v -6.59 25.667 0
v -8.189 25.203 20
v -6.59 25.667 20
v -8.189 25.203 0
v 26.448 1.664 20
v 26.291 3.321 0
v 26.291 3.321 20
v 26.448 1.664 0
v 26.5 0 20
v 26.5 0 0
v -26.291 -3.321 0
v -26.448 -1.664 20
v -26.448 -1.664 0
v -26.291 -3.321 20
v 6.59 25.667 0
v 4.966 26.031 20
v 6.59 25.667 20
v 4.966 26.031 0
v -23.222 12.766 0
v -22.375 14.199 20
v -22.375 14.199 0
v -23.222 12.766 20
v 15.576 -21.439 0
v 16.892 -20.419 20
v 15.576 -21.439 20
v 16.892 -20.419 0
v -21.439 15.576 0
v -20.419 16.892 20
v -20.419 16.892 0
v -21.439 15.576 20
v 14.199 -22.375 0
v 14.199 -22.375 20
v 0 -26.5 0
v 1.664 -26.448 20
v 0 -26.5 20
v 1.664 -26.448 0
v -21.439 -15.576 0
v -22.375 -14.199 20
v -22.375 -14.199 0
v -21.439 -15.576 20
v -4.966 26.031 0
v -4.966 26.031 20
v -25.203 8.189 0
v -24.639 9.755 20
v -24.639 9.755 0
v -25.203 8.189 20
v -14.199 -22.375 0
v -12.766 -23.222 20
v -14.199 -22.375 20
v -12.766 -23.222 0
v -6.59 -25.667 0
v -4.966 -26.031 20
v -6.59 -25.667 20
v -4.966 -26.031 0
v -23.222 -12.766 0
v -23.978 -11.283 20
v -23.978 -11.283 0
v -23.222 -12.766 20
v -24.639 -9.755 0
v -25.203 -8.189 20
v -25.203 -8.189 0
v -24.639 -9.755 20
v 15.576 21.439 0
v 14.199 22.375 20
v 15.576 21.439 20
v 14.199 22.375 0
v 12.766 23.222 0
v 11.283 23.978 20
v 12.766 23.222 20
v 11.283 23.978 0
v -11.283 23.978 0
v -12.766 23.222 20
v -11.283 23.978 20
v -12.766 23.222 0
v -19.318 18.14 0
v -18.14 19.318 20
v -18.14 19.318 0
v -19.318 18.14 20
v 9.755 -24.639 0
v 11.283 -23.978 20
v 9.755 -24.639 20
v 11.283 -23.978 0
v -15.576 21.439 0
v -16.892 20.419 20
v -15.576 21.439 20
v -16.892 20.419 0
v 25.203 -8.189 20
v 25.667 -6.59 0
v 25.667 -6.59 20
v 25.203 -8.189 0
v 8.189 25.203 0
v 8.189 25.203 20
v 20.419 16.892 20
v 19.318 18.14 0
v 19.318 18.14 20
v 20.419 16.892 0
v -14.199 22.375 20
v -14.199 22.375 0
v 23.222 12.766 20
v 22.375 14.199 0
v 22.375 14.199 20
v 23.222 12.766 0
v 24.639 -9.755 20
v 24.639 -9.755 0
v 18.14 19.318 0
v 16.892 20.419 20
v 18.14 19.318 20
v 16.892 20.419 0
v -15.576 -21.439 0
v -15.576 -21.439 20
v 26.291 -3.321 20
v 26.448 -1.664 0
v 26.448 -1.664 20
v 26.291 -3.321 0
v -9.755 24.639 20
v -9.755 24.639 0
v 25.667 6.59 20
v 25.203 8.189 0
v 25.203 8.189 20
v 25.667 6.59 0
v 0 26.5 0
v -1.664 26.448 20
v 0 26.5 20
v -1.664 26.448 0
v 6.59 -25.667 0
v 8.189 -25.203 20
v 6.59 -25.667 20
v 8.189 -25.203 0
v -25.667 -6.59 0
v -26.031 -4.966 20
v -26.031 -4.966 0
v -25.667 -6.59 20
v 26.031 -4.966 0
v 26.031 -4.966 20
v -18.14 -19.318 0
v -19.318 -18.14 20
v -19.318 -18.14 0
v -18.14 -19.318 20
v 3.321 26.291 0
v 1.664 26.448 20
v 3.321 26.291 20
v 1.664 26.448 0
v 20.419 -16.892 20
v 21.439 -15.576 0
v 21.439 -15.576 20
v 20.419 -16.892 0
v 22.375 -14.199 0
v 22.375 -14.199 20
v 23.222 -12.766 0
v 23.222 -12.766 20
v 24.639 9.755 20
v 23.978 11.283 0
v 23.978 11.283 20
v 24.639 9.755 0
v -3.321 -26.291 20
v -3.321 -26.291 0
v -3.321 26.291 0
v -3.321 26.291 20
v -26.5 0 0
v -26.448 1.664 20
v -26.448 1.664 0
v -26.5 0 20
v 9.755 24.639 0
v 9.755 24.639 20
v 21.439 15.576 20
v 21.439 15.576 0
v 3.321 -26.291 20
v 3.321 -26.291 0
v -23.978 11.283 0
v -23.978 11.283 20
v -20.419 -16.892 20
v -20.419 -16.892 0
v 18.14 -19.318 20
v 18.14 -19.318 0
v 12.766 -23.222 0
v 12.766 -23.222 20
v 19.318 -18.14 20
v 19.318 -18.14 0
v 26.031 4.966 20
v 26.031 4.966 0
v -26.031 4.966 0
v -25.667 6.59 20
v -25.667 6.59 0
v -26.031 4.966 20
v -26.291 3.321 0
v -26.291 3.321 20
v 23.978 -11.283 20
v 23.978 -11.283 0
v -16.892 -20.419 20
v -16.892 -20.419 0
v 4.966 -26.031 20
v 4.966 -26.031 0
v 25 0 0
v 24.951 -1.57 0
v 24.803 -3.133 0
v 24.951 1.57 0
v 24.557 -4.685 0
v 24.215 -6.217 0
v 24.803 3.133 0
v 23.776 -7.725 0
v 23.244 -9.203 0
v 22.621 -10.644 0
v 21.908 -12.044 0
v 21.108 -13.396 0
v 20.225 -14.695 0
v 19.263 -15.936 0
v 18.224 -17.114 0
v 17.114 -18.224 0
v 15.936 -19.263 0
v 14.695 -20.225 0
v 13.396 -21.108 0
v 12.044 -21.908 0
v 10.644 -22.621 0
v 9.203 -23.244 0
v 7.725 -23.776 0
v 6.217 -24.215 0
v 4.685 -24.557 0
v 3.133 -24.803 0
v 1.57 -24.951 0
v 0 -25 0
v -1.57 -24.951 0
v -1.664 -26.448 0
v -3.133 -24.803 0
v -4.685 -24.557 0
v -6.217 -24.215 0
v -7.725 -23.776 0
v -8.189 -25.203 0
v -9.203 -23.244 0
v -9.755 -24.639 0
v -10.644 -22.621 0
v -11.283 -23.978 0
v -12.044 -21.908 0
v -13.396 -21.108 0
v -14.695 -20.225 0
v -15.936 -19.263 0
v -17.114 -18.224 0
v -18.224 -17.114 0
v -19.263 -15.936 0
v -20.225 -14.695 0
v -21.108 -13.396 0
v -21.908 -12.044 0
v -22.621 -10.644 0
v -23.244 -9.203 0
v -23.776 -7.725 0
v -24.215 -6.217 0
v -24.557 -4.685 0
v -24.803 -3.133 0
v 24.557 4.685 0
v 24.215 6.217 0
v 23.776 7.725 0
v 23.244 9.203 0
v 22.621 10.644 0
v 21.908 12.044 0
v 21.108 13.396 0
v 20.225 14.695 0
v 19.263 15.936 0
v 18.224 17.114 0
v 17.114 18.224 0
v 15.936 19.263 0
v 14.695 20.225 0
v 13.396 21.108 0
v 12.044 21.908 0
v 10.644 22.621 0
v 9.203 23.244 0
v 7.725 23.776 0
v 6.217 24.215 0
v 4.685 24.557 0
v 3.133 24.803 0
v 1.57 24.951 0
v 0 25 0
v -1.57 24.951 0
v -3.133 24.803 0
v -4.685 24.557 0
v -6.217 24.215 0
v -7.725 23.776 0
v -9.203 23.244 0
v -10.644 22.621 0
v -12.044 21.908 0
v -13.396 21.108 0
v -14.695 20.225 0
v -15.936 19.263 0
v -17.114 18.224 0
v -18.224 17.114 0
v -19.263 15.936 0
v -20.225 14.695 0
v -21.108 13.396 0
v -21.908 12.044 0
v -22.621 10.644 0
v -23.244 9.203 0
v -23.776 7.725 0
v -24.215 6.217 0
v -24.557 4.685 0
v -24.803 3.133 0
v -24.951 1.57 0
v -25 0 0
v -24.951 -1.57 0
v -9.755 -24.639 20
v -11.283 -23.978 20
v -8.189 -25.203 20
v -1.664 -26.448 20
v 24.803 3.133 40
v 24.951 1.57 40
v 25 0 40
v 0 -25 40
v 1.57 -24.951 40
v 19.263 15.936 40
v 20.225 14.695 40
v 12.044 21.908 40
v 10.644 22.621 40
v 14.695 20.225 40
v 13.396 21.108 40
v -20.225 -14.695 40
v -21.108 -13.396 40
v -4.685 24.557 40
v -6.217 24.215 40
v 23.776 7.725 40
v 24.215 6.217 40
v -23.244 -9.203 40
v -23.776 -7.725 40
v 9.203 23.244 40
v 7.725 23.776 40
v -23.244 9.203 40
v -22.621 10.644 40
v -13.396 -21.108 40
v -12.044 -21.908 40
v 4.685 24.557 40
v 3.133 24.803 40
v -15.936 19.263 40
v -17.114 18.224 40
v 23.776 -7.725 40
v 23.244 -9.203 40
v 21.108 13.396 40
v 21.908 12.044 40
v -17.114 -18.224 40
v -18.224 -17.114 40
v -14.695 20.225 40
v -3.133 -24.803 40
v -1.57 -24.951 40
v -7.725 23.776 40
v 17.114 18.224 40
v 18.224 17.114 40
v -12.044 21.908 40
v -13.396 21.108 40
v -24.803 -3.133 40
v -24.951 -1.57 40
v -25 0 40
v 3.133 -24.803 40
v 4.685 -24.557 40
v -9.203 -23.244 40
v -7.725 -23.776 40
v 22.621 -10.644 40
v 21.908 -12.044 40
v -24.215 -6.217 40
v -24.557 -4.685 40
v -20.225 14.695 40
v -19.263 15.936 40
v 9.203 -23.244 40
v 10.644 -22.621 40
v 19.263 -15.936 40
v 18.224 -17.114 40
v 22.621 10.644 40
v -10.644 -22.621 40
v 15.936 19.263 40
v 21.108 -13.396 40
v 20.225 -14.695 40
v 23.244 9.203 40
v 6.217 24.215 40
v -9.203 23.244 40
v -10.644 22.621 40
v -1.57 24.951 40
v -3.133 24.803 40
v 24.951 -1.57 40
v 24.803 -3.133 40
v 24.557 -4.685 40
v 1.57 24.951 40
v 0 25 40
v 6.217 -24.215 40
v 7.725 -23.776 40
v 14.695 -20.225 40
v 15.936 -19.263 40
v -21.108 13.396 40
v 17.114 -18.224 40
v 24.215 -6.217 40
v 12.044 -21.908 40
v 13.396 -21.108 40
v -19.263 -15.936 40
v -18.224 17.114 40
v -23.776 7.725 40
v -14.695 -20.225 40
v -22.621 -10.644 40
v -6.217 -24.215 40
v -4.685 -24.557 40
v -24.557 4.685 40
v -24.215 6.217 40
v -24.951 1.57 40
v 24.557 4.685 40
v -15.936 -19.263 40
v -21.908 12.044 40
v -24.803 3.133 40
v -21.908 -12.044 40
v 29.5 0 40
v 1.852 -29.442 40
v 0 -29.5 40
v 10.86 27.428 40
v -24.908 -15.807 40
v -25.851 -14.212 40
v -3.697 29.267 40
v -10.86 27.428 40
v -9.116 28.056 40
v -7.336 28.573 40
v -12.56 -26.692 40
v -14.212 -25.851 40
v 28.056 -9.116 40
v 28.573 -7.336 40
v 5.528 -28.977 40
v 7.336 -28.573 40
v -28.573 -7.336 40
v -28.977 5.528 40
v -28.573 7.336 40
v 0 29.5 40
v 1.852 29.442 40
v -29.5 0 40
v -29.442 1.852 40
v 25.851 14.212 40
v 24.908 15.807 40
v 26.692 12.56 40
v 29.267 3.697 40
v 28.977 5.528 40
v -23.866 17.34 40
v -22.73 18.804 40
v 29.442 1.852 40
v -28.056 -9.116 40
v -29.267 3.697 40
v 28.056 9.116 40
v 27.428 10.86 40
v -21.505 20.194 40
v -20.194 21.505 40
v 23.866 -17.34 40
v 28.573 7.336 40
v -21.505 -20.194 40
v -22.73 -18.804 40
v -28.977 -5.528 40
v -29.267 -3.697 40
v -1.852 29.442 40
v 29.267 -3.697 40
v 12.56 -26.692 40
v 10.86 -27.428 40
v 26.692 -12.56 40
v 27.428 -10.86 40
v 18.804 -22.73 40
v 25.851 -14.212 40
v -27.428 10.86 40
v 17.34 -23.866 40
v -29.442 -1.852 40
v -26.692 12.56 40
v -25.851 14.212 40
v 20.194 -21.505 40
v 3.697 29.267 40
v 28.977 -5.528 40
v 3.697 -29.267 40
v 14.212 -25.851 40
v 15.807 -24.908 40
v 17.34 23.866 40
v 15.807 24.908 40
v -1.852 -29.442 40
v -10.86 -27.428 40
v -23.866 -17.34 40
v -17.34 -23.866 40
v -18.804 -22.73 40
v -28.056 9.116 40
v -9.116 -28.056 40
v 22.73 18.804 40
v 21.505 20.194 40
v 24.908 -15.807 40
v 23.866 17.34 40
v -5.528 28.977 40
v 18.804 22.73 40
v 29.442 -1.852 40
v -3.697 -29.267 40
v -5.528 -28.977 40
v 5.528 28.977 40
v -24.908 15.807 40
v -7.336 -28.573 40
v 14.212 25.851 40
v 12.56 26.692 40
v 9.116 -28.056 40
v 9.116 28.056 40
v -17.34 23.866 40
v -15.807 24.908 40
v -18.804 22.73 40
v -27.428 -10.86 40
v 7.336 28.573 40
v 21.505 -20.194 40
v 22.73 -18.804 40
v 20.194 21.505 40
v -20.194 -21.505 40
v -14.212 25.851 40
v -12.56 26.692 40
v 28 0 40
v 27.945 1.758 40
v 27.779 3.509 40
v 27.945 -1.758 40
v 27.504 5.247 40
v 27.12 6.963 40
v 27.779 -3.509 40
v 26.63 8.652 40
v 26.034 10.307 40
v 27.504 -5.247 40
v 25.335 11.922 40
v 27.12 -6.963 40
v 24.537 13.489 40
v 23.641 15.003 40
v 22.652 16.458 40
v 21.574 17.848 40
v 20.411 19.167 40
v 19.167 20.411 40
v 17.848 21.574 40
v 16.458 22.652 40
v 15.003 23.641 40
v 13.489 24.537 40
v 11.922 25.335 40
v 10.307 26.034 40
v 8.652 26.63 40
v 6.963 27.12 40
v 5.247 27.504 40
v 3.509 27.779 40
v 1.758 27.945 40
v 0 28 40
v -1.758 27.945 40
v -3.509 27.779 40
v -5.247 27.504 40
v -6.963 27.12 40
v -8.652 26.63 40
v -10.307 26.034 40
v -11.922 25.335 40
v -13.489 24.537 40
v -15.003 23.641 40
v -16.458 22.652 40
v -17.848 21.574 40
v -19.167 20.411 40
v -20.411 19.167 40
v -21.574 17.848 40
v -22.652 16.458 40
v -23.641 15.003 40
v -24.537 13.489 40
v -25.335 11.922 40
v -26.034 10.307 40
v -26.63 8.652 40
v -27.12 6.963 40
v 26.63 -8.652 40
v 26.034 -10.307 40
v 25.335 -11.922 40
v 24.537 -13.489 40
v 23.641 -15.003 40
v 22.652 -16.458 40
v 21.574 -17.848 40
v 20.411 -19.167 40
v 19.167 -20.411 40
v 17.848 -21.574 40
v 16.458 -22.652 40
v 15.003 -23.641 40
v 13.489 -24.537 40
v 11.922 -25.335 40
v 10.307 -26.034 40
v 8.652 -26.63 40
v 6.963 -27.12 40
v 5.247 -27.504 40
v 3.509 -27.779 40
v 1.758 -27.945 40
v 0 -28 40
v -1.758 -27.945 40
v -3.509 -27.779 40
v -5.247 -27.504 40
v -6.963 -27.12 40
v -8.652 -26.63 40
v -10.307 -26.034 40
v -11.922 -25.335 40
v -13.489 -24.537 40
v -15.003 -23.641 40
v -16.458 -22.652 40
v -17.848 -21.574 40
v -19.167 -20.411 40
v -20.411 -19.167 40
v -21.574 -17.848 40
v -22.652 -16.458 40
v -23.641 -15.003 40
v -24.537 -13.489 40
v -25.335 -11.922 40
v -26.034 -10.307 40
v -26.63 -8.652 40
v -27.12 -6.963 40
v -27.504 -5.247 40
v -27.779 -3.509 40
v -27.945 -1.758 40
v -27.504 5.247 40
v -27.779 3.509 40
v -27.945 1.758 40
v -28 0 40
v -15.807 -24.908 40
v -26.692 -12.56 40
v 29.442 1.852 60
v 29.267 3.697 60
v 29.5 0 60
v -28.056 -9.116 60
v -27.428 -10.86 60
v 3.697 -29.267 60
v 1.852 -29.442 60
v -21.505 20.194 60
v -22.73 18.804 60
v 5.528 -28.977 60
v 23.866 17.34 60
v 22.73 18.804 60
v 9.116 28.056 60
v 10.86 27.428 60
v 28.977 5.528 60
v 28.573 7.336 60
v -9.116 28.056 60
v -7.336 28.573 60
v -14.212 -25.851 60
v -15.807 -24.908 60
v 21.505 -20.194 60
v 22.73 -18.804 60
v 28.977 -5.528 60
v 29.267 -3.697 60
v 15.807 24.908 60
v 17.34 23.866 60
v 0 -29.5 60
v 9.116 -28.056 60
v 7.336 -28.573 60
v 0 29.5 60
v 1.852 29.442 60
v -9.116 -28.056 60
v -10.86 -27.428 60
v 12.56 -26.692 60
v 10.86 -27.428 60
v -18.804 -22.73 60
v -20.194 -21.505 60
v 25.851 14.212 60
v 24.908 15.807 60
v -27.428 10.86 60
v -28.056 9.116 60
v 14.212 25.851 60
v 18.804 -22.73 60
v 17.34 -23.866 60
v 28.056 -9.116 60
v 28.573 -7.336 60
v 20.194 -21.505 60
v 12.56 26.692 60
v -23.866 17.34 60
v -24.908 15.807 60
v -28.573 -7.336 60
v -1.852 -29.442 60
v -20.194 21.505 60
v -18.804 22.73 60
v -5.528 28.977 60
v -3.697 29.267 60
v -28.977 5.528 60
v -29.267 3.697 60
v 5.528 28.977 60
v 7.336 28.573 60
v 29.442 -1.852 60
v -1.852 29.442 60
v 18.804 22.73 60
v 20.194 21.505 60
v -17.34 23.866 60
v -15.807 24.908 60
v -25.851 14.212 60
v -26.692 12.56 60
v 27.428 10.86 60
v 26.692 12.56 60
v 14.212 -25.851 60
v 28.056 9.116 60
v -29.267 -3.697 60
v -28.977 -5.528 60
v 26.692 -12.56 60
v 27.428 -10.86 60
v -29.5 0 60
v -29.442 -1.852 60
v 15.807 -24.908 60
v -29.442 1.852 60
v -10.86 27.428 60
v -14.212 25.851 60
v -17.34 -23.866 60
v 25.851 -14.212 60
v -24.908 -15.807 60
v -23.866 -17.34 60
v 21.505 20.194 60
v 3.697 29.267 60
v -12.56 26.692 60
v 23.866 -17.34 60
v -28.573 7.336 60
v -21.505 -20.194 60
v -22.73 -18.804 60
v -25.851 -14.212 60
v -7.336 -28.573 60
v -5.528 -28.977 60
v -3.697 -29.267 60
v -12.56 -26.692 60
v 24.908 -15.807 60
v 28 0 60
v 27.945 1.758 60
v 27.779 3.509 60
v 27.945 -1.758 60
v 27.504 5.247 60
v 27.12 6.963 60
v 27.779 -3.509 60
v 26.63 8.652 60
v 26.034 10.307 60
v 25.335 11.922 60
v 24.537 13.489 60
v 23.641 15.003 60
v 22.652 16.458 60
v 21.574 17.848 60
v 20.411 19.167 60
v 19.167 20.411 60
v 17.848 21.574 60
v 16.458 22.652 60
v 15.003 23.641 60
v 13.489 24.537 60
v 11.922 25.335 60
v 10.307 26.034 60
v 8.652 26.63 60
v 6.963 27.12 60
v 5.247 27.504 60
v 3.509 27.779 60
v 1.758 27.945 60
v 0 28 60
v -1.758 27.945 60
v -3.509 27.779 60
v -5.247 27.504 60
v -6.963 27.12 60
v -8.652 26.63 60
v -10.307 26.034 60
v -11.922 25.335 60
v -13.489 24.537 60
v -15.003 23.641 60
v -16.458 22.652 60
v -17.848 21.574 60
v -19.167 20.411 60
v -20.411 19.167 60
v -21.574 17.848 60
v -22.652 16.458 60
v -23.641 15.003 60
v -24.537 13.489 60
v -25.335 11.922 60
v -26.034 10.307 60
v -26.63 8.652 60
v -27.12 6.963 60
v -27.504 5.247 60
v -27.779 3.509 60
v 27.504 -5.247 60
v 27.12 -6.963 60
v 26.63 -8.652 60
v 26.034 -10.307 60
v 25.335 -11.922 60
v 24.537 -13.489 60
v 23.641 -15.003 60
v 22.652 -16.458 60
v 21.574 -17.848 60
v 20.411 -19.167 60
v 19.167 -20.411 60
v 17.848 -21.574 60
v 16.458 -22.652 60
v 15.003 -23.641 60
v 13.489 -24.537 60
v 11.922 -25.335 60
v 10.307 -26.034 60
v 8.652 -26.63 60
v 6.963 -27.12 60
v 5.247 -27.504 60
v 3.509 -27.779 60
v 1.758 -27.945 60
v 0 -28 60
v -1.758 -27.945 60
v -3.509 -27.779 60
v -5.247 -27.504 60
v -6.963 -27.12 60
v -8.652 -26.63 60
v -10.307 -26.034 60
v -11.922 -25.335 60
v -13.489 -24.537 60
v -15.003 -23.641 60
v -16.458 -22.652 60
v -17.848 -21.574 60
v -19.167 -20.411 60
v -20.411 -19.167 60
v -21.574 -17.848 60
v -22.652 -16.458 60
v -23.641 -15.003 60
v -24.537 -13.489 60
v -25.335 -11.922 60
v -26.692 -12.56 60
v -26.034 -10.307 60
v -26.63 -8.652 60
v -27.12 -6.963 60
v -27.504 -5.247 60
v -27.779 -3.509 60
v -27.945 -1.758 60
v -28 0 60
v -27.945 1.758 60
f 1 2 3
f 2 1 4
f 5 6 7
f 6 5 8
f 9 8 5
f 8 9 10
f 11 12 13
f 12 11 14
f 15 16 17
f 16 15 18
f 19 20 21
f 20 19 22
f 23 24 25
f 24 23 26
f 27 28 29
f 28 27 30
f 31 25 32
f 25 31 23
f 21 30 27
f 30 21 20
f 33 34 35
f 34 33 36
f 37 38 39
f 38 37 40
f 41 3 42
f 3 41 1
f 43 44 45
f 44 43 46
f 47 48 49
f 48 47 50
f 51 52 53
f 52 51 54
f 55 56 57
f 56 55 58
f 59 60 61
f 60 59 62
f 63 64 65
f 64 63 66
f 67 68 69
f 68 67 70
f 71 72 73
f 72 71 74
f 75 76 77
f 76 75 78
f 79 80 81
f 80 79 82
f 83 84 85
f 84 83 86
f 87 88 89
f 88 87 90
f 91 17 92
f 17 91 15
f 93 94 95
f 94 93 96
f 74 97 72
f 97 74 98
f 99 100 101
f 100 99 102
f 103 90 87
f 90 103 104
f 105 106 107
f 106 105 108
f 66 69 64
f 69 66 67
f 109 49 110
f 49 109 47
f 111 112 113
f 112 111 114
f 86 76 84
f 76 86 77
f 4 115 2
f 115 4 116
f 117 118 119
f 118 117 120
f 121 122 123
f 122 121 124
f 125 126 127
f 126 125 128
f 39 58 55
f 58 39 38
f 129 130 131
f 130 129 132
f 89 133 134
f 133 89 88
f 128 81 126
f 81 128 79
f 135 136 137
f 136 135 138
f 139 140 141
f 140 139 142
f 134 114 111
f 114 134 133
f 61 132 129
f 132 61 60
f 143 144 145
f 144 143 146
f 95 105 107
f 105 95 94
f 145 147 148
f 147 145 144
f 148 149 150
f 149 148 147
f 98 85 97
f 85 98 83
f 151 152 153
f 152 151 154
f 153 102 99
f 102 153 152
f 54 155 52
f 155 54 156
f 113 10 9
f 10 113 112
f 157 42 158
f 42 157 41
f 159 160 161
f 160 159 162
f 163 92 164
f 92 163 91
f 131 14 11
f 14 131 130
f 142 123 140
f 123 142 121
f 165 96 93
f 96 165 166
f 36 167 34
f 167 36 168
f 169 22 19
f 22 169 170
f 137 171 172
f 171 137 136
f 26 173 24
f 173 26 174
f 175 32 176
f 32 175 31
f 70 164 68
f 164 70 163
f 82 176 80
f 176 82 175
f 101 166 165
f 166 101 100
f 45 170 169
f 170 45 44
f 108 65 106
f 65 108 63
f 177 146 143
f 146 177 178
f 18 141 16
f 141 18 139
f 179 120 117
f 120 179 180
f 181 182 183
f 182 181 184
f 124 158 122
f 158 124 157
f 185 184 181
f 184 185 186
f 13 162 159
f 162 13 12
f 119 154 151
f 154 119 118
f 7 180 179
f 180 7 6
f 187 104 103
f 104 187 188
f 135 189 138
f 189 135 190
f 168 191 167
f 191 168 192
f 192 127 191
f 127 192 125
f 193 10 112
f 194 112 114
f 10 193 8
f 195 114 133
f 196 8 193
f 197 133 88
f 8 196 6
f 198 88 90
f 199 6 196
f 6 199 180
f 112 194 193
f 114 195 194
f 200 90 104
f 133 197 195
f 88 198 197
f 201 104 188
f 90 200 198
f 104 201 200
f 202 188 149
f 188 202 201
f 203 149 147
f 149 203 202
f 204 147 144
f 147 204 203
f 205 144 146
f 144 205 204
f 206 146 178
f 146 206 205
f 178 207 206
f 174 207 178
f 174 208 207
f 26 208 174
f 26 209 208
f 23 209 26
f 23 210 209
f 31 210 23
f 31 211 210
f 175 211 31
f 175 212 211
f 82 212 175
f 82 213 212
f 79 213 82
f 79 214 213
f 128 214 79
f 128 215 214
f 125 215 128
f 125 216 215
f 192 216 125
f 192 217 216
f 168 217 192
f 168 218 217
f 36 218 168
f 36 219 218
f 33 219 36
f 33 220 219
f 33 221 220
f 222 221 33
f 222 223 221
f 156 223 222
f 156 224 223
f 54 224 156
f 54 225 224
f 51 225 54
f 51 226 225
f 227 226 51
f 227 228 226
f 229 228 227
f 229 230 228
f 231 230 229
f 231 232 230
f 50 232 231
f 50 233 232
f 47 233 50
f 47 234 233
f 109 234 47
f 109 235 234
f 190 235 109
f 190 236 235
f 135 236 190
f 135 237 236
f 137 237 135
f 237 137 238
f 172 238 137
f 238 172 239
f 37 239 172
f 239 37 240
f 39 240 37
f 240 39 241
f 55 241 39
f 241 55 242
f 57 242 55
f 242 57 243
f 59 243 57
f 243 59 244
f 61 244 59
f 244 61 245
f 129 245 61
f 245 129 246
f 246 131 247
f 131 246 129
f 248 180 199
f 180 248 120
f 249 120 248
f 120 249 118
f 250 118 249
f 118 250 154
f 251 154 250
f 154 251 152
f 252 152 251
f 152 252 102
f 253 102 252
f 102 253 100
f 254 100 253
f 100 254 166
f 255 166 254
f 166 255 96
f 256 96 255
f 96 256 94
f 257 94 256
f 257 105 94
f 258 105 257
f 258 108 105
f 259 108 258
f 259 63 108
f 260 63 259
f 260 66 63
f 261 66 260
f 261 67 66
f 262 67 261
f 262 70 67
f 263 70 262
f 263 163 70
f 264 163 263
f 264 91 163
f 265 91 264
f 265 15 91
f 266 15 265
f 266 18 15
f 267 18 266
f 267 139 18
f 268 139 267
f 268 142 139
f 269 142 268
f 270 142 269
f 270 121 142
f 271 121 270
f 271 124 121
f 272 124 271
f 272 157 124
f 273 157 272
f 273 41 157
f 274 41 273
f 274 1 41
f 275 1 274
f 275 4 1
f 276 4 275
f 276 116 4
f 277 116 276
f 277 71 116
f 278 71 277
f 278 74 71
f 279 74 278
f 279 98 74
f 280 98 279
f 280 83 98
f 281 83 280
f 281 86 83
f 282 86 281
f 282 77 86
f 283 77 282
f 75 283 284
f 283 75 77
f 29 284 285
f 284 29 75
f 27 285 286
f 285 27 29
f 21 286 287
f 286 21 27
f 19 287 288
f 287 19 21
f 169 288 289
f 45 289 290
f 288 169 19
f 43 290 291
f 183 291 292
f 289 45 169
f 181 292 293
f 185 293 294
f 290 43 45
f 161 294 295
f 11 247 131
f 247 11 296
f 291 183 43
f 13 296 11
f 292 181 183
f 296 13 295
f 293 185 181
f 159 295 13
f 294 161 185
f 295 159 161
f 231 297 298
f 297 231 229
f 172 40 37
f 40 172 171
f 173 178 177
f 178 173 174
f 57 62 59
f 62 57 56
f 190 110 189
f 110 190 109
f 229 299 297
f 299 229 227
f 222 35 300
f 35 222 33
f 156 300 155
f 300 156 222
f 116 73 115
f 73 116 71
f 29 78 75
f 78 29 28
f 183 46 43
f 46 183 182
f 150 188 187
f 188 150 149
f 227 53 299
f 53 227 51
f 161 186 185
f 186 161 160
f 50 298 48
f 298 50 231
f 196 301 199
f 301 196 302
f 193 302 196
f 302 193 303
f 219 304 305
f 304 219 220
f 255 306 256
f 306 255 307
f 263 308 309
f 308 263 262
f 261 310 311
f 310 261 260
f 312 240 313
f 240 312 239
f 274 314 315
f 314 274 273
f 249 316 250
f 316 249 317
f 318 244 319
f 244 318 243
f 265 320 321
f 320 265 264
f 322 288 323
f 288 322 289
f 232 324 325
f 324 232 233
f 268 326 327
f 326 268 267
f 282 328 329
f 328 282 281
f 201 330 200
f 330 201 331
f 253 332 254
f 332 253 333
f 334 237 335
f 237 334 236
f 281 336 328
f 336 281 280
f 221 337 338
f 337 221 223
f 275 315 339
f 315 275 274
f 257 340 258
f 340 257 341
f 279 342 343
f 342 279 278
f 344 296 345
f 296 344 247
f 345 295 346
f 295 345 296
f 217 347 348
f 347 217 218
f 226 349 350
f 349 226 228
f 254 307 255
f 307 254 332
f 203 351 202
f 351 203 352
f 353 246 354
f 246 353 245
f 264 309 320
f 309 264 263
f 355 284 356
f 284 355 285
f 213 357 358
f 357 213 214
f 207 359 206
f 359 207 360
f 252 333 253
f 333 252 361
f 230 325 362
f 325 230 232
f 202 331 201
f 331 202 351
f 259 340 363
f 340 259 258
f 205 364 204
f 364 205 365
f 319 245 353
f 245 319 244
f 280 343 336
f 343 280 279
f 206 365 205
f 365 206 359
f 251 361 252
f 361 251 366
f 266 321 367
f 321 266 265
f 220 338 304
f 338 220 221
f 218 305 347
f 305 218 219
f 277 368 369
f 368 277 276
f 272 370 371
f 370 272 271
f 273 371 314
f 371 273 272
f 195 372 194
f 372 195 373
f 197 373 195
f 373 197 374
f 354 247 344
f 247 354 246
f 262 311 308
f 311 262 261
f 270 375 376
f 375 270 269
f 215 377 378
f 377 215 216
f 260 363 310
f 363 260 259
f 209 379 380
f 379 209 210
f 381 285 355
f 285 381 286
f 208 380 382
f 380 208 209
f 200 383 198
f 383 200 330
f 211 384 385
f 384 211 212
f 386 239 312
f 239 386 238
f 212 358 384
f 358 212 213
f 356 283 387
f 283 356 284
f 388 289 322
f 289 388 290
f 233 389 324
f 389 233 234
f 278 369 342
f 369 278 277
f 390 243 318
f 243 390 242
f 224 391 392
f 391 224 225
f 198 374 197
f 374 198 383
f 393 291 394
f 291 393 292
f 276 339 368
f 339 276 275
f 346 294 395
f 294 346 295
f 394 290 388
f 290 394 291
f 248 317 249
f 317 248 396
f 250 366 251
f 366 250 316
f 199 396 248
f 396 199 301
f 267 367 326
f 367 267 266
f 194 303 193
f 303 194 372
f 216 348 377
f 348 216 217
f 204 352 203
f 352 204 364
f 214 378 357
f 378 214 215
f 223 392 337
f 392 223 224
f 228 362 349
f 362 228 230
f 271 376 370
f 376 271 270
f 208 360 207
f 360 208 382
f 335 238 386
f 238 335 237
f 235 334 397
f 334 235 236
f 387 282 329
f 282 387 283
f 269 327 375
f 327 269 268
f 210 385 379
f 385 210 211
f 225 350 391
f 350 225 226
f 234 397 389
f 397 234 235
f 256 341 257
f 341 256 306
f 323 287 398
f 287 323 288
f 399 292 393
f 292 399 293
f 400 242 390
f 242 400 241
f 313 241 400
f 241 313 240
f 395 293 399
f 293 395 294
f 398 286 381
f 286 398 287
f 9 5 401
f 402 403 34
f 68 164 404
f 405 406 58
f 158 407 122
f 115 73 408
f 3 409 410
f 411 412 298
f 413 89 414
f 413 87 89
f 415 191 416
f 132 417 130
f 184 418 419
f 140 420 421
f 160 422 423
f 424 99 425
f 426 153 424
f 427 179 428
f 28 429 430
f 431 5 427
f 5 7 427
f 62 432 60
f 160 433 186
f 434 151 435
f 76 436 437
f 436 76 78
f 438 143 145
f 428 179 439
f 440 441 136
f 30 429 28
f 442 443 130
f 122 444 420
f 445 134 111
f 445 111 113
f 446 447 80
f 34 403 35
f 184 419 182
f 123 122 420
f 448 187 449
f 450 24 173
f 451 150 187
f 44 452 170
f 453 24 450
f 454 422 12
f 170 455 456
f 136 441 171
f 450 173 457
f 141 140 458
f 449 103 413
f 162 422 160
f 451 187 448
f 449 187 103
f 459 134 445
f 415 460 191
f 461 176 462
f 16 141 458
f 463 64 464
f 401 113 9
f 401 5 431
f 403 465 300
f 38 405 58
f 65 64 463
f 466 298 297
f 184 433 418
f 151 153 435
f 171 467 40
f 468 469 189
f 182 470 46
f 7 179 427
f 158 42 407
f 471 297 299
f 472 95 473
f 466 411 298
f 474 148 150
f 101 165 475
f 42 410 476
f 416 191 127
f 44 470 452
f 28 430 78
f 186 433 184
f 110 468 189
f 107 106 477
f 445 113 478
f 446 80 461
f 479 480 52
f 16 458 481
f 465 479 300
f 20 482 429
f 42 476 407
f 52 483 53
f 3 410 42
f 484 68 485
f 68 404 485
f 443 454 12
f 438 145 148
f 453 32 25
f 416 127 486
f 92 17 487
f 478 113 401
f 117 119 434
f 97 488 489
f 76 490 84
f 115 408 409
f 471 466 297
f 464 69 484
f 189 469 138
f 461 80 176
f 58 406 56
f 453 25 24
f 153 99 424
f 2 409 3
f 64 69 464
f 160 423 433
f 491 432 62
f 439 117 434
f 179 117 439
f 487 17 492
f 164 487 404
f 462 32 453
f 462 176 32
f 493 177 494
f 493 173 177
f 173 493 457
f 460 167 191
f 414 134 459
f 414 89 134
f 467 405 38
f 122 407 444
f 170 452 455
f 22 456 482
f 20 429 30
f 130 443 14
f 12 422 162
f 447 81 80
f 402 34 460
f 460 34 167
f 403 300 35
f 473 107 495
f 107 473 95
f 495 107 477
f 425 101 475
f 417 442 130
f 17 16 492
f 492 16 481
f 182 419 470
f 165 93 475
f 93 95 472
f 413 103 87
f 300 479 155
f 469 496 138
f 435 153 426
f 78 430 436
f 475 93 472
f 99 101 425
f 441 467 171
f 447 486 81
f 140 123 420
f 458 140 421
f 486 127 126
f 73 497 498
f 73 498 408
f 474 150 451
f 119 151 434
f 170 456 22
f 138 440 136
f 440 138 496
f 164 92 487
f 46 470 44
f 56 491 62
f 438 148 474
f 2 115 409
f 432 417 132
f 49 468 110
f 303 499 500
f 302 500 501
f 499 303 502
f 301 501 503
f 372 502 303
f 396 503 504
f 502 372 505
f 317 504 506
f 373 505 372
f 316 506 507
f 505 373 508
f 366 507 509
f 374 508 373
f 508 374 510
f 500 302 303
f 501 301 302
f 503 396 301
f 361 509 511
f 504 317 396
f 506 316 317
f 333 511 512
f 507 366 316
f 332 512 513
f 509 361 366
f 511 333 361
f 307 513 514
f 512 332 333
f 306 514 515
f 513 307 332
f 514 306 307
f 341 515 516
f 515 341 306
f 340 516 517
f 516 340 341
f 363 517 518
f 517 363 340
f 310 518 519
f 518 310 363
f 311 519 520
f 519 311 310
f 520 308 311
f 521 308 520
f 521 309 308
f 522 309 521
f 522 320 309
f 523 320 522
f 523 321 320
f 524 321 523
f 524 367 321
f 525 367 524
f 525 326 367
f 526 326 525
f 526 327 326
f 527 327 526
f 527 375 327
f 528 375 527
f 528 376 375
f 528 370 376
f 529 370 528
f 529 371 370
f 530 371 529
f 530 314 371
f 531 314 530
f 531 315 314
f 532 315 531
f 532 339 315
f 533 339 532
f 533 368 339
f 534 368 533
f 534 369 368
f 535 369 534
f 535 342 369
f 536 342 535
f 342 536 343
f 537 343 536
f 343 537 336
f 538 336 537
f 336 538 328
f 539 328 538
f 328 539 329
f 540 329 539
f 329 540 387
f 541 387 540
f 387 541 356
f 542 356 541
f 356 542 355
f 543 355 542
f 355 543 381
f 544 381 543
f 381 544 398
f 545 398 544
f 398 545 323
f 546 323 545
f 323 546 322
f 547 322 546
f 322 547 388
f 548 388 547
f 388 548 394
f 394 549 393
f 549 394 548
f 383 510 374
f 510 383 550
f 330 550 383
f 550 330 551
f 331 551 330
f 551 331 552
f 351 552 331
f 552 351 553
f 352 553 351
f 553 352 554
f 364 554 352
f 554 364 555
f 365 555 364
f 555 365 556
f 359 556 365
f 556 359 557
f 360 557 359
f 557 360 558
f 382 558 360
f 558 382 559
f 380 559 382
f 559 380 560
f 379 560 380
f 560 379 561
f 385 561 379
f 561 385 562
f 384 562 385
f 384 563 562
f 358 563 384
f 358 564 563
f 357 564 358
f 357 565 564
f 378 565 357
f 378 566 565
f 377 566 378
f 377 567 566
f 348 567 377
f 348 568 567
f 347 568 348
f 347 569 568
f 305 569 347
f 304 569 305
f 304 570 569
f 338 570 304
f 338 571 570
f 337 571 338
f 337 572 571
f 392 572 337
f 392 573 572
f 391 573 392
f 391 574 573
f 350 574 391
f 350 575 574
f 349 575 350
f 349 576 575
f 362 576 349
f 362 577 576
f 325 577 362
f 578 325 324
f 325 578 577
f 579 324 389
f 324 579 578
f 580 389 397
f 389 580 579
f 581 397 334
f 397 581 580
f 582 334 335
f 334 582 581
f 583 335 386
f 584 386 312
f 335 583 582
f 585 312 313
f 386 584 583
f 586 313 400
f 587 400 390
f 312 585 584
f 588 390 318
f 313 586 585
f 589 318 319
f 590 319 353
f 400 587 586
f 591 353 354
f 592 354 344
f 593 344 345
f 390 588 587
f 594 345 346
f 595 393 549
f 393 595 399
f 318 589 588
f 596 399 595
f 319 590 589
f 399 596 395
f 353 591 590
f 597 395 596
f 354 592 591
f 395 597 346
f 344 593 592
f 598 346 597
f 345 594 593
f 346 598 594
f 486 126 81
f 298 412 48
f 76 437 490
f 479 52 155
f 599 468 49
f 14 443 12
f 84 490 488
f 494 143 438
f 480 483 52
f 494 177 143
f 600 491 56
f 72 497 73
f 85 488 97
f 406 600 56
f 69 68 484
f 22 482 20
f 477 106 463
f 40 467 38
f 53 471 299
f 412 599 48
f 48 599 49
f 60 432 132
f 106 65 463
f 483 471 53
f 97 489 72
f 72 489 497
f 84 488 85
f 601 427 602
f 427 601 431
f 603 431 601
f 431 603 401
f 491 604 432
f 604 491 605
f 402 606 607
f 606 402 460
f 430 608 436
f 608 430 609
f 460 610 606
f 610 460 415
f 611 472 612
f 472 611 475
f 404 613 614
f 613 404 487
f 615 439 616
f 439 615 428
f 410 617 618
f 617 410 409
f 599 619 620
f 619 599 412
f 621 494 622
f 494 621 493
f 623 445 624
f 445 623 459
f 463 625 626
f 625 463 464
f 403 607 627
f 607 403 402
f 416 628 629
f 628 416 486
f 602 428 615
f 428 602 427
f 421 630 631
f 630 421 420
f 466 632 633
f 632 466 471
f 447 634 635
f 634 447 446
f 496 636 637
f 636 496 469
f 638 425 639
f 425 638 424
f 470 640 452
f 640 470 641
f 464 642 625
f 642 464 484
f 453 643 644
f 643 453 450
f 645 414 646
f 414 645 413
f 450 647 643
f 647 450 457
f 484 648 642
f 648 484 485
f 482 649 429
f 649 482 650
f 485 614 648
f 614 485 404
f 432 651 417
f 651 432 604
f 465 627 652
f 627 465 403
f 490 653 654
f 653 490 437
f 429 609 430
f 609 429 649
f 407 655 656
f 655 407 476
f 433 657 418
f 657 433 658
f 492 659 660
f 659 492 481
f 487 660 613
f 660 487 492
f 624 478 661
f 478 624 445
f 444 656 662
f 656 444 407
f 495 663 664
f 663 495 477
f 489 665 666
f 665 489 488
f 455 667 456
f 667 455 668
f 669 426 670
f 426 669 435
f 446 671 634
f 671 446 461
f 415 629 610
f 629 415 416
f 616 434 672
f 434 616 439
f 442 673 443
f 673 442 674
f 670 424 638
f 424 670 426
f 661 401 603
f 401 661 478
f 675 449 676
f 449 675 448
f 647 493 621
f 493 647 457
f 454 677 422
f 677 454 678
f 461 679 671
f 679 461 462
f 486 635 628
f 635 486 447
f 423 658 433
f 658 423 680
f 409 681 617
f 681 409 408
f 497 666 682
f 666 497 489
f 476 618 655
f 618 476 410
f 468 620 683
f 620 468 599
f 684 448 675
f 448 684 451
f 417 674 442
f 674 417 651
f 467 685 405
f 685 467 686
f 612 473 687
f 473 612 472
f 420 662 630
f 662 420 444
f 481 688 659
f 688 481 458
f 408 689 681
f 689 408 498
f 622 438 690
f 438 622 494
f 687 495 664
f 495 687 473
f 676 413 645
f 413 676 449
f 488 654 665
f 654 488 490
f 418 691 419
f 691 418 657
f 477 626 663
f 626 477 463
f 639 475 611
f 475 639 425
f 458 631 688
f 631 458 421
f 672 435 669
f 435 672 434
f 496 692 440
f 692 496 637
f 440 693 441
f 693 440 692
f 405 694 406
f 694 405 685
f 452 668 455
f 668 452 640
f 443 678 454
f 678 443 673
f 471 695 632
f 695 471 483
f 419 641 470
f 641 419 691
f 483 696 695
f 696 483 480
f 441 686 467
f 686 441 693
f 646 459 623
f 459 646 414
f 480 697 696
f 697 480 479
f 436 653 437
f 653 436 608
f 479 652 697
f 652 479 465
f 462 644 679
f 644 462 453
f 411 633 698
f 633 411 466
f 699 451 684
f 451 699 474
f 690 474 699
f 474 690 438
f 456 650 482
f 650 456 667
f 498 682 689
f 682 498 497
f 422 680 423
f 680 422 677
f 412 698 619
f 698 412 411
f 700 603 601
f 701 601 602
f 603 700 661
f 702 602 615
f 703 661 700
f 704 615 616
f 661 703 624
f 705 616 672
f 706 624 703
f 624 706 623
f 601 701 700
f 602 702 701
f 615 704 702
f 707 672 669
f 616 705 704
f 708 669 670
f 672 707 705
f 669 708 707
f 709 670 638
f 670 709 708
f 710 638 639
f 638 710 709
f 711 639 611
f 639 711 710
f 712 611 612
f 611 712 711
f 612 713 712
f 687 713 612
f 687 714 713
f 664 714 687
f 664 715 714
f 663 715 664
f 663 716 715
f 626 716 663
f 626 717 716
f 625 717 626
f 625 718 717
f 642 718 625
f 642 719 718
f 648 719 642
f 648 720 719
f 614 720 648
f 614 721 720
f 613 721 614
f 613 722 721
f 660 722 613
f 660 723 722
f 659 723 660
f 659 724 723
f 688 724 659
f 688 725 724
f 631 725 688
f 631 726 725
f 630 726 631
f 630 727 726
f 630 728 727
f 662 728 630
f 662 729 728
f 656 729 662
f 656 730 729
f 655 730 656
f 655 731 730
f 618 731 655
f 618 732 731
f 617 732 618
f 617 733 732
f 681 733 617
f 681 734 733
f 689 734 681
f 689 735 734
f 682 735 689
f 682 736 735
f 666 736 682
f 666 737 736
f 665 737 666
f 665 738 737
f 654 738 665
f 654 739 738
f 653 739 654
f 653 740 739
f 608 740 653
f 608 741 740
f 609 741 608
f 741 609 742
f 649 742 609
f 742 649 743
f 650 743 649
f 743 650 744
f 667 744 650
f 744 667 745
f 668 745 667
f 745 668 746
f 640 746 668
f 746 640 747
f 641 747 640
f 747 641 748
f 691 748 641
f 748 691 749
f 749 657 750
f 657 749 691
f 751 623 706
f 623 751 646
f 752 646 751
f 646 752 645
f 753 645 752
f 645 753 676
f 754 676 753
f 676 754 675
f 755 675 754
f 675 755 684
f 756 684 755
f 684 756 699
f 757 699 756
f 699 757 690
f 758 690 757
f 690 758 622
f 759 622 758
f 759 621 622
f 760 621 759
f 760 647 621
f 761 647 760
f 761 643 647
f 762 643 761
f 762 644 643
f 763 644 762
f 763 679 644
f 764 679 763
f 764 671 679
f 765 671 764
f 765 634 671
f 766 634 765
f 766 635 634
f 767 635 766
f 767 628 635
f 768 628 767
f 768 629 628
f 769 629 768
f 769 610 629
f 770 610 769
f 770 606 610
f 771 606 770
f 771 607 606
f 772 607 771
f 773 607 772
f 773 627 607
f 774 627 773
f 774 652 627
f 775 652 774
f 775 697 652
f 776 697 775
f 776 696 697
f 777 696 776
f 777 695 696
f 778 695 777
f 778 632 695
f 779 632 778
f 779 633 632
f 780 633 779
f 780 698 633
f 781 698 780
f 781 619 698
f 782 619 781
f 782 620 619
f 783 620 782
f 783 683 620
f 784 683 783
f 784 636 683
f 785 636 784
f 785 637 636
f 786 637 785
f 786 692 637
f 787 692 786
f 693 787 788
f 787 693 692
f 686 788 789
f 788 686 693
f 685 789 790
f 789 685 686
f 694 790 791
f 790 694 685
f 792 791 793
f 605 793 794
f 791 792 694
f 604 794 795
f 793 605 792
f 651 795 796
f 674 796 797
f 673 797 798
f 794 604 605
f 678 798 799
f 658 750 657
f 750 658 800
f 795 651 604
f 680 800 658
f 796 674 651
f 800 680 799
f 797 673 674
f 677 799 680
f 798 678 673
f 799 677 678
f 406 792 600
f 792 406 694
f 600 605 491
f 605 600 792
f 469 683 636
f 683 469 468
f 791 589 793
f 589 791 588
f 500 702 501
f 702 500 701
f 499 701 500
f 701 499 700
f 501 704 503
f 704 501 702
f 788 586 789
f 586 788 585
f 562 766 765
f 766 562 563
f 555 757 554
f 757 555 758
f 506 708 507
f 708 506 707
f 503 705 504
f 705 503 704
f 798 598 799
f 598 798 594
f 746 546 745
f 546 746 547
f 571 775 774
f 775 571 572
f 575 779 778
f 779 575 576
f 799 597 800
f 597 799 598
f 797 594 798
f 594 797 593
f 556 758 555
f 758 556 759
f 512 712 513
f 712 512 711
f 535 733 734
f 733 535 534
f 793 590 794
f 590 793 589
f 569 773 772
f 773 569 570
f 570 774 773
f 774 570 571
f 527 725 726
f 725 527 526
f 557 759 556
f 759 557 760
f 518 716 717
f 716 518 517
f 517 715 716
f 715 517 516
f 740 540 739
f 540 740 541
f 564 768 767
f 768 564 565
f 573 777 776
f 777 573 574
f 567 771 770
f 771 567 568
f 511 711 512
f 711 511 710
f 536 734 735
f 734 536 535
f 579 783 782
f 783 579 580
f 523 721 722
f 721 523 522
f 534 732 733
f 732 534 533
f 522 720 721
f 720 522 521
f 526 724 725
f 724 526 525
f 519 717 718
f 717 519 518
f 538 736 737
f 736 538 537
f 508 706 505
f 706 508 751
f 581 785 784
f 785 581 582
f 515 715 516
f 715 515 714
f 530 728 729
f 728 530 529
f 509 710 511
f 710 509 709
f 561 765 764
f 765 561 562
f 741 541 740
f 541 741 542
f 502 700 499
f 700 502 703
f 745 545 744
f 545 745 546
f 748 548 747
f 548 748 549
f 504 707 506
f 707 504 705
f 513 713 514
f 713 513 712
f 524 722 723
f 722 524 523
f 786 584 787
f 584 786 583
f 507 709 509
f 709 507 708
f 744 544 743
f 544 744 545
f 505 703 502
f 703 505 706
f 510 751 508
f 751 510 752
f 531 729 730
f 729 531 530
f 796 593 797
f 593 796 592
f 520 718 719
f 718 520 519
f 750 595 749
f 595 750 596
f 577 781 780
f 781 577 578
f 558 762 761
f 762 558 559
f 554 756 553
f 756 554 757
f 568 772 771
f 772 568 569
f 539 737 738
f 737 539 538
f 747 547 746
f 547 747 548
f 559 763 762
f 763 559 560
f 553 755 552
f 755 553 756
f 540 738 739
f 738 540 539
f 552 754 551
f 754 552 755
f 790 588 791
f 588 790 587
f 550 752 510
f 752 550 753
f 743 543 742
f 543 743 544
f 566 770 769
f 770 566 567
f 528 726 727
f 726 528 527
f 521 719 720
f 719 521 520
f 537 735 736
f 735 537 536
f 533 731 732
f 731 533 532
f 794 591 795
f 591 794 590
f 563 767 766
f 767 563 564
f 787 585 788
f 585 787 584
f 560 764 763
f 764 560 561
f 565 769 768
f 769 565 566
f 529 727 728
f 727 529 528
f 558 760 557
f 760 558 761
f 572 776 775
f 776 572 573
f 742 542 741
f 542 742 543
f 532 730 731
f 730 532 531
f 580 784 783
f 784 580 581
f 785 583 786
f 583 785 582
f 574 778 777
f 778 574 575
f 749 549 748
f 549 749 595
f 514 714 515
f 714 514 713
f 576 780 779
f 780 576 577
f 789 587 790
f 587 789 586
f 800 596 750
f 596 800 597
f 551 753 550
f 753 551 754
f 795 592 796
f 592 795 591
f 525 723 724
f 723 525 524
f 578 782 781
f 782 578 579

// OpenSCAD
//small end inner diameter in mm
small_end_inner=50; 

//small end outer diameter in mm
small_end_outer=53; 


//small end length in mm
small_end_len=20; 

//large end inner diameter in mm
large_end_inner=56; 


//large end outer diameter in mm
large_end_outer=59; 

//large end length in mm
large_end_len=20; 


//center section length in mm
center_end_len=20; 

union() {
difference(){
cylinder(h=small_end_len, r=small_end_outer/2, center=false,$fn=100);
cylinder(h=small_end_len, r=small_end_inner/2, center=false,$fn=100);
}



translate([0,0,small_end_len]) difference(){
cylinder(h=center_end_len, r1=small_end_outer/2, r2=large_end_outer/2,center=false,$fn=100);
cylinder(h=center_end_len, r=small_end_inner/2, center=false,$fn=100);
}


translate([0,0,small_end_len+center_end_len]) difference(){
cylinder(h=large_end_len, r=large_end_outer/2, center=false,$fn=100);
cylinder(h=large_end_len, r=large_end_inner/2, center=false,$fn=100);
}


} //union
